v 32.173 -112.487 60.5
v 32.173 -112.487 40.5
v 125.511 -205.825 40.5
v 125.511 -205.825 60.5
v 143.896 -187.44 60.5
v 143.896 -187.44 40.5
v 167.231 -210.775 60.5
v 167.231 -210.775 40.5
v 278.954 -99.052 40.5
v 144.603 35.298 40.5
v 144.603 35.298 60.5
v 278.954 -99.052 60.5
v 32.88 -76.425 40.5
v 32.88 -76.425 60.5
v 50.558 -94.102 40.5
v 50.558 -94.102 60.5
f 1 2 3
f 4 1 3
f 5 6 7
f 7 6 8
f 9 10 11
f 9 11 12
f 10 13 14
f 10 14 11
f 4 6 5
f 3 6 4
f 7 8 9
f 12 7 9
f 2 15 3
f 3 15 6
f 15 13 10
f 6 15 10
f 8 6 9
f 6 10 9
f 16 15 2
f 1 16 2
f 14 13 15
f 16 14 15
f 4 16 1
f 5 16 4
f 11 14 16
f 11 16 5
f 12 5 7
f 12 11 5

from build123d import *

# Parameters (mm, degrees)
BOX047_W               = 26
BOX047_H               = 132
BOX047_DEPTH           = 20
BOX047_PLACEMENT_ANGLE = 135
BOX046_W               = 190
BOX046_H               = 158
BOX046_DEPTH           = 20
BOX046_PLACEMENT_ANGLE = 315


with BuildPart() as cube009:
    # Box047 → Box047 (new body)
    with BuildSketch(Plane.XY):
        with Locations((13, 66)):
            Rectangle(BOX047_W, BOX047_H)
    extrude(amount=BOX047_DEPTH)


with BuildPart() as cube009_1:
    # Box047 placement: moved
    add(cube009.part.moved(Location((50.558135, -94.102291, 40.5))).rotate(Axis((50.558135, -94.102291, 40.5), (0, 0, -1)), BOX047_PLACEMENT_ANGLE))


with BuildPart() as fusion012:
    # Box046 → Box046 (new body)
    with BuildSketch(Plane.XY):
        with Locations((95, 79)):
            Rectangle(BOX046_W, BOX046_H)
    extrude(amount=BOX046_DEPTH)


with BuildPart() as fusion012_1:
    # Box046 placement: moved
    add(fusion012.part.moved(Location((32.880465, -76.424621, 40.5))).rotate(Axis((32.880465, -76.424621, 40.5), (0, 0, 1)), BOX046_PLACEMENT_ANGLE))

    # Fusion012: union Cube009
    add(cube009_1.part)


solid = fusion012_1.part
